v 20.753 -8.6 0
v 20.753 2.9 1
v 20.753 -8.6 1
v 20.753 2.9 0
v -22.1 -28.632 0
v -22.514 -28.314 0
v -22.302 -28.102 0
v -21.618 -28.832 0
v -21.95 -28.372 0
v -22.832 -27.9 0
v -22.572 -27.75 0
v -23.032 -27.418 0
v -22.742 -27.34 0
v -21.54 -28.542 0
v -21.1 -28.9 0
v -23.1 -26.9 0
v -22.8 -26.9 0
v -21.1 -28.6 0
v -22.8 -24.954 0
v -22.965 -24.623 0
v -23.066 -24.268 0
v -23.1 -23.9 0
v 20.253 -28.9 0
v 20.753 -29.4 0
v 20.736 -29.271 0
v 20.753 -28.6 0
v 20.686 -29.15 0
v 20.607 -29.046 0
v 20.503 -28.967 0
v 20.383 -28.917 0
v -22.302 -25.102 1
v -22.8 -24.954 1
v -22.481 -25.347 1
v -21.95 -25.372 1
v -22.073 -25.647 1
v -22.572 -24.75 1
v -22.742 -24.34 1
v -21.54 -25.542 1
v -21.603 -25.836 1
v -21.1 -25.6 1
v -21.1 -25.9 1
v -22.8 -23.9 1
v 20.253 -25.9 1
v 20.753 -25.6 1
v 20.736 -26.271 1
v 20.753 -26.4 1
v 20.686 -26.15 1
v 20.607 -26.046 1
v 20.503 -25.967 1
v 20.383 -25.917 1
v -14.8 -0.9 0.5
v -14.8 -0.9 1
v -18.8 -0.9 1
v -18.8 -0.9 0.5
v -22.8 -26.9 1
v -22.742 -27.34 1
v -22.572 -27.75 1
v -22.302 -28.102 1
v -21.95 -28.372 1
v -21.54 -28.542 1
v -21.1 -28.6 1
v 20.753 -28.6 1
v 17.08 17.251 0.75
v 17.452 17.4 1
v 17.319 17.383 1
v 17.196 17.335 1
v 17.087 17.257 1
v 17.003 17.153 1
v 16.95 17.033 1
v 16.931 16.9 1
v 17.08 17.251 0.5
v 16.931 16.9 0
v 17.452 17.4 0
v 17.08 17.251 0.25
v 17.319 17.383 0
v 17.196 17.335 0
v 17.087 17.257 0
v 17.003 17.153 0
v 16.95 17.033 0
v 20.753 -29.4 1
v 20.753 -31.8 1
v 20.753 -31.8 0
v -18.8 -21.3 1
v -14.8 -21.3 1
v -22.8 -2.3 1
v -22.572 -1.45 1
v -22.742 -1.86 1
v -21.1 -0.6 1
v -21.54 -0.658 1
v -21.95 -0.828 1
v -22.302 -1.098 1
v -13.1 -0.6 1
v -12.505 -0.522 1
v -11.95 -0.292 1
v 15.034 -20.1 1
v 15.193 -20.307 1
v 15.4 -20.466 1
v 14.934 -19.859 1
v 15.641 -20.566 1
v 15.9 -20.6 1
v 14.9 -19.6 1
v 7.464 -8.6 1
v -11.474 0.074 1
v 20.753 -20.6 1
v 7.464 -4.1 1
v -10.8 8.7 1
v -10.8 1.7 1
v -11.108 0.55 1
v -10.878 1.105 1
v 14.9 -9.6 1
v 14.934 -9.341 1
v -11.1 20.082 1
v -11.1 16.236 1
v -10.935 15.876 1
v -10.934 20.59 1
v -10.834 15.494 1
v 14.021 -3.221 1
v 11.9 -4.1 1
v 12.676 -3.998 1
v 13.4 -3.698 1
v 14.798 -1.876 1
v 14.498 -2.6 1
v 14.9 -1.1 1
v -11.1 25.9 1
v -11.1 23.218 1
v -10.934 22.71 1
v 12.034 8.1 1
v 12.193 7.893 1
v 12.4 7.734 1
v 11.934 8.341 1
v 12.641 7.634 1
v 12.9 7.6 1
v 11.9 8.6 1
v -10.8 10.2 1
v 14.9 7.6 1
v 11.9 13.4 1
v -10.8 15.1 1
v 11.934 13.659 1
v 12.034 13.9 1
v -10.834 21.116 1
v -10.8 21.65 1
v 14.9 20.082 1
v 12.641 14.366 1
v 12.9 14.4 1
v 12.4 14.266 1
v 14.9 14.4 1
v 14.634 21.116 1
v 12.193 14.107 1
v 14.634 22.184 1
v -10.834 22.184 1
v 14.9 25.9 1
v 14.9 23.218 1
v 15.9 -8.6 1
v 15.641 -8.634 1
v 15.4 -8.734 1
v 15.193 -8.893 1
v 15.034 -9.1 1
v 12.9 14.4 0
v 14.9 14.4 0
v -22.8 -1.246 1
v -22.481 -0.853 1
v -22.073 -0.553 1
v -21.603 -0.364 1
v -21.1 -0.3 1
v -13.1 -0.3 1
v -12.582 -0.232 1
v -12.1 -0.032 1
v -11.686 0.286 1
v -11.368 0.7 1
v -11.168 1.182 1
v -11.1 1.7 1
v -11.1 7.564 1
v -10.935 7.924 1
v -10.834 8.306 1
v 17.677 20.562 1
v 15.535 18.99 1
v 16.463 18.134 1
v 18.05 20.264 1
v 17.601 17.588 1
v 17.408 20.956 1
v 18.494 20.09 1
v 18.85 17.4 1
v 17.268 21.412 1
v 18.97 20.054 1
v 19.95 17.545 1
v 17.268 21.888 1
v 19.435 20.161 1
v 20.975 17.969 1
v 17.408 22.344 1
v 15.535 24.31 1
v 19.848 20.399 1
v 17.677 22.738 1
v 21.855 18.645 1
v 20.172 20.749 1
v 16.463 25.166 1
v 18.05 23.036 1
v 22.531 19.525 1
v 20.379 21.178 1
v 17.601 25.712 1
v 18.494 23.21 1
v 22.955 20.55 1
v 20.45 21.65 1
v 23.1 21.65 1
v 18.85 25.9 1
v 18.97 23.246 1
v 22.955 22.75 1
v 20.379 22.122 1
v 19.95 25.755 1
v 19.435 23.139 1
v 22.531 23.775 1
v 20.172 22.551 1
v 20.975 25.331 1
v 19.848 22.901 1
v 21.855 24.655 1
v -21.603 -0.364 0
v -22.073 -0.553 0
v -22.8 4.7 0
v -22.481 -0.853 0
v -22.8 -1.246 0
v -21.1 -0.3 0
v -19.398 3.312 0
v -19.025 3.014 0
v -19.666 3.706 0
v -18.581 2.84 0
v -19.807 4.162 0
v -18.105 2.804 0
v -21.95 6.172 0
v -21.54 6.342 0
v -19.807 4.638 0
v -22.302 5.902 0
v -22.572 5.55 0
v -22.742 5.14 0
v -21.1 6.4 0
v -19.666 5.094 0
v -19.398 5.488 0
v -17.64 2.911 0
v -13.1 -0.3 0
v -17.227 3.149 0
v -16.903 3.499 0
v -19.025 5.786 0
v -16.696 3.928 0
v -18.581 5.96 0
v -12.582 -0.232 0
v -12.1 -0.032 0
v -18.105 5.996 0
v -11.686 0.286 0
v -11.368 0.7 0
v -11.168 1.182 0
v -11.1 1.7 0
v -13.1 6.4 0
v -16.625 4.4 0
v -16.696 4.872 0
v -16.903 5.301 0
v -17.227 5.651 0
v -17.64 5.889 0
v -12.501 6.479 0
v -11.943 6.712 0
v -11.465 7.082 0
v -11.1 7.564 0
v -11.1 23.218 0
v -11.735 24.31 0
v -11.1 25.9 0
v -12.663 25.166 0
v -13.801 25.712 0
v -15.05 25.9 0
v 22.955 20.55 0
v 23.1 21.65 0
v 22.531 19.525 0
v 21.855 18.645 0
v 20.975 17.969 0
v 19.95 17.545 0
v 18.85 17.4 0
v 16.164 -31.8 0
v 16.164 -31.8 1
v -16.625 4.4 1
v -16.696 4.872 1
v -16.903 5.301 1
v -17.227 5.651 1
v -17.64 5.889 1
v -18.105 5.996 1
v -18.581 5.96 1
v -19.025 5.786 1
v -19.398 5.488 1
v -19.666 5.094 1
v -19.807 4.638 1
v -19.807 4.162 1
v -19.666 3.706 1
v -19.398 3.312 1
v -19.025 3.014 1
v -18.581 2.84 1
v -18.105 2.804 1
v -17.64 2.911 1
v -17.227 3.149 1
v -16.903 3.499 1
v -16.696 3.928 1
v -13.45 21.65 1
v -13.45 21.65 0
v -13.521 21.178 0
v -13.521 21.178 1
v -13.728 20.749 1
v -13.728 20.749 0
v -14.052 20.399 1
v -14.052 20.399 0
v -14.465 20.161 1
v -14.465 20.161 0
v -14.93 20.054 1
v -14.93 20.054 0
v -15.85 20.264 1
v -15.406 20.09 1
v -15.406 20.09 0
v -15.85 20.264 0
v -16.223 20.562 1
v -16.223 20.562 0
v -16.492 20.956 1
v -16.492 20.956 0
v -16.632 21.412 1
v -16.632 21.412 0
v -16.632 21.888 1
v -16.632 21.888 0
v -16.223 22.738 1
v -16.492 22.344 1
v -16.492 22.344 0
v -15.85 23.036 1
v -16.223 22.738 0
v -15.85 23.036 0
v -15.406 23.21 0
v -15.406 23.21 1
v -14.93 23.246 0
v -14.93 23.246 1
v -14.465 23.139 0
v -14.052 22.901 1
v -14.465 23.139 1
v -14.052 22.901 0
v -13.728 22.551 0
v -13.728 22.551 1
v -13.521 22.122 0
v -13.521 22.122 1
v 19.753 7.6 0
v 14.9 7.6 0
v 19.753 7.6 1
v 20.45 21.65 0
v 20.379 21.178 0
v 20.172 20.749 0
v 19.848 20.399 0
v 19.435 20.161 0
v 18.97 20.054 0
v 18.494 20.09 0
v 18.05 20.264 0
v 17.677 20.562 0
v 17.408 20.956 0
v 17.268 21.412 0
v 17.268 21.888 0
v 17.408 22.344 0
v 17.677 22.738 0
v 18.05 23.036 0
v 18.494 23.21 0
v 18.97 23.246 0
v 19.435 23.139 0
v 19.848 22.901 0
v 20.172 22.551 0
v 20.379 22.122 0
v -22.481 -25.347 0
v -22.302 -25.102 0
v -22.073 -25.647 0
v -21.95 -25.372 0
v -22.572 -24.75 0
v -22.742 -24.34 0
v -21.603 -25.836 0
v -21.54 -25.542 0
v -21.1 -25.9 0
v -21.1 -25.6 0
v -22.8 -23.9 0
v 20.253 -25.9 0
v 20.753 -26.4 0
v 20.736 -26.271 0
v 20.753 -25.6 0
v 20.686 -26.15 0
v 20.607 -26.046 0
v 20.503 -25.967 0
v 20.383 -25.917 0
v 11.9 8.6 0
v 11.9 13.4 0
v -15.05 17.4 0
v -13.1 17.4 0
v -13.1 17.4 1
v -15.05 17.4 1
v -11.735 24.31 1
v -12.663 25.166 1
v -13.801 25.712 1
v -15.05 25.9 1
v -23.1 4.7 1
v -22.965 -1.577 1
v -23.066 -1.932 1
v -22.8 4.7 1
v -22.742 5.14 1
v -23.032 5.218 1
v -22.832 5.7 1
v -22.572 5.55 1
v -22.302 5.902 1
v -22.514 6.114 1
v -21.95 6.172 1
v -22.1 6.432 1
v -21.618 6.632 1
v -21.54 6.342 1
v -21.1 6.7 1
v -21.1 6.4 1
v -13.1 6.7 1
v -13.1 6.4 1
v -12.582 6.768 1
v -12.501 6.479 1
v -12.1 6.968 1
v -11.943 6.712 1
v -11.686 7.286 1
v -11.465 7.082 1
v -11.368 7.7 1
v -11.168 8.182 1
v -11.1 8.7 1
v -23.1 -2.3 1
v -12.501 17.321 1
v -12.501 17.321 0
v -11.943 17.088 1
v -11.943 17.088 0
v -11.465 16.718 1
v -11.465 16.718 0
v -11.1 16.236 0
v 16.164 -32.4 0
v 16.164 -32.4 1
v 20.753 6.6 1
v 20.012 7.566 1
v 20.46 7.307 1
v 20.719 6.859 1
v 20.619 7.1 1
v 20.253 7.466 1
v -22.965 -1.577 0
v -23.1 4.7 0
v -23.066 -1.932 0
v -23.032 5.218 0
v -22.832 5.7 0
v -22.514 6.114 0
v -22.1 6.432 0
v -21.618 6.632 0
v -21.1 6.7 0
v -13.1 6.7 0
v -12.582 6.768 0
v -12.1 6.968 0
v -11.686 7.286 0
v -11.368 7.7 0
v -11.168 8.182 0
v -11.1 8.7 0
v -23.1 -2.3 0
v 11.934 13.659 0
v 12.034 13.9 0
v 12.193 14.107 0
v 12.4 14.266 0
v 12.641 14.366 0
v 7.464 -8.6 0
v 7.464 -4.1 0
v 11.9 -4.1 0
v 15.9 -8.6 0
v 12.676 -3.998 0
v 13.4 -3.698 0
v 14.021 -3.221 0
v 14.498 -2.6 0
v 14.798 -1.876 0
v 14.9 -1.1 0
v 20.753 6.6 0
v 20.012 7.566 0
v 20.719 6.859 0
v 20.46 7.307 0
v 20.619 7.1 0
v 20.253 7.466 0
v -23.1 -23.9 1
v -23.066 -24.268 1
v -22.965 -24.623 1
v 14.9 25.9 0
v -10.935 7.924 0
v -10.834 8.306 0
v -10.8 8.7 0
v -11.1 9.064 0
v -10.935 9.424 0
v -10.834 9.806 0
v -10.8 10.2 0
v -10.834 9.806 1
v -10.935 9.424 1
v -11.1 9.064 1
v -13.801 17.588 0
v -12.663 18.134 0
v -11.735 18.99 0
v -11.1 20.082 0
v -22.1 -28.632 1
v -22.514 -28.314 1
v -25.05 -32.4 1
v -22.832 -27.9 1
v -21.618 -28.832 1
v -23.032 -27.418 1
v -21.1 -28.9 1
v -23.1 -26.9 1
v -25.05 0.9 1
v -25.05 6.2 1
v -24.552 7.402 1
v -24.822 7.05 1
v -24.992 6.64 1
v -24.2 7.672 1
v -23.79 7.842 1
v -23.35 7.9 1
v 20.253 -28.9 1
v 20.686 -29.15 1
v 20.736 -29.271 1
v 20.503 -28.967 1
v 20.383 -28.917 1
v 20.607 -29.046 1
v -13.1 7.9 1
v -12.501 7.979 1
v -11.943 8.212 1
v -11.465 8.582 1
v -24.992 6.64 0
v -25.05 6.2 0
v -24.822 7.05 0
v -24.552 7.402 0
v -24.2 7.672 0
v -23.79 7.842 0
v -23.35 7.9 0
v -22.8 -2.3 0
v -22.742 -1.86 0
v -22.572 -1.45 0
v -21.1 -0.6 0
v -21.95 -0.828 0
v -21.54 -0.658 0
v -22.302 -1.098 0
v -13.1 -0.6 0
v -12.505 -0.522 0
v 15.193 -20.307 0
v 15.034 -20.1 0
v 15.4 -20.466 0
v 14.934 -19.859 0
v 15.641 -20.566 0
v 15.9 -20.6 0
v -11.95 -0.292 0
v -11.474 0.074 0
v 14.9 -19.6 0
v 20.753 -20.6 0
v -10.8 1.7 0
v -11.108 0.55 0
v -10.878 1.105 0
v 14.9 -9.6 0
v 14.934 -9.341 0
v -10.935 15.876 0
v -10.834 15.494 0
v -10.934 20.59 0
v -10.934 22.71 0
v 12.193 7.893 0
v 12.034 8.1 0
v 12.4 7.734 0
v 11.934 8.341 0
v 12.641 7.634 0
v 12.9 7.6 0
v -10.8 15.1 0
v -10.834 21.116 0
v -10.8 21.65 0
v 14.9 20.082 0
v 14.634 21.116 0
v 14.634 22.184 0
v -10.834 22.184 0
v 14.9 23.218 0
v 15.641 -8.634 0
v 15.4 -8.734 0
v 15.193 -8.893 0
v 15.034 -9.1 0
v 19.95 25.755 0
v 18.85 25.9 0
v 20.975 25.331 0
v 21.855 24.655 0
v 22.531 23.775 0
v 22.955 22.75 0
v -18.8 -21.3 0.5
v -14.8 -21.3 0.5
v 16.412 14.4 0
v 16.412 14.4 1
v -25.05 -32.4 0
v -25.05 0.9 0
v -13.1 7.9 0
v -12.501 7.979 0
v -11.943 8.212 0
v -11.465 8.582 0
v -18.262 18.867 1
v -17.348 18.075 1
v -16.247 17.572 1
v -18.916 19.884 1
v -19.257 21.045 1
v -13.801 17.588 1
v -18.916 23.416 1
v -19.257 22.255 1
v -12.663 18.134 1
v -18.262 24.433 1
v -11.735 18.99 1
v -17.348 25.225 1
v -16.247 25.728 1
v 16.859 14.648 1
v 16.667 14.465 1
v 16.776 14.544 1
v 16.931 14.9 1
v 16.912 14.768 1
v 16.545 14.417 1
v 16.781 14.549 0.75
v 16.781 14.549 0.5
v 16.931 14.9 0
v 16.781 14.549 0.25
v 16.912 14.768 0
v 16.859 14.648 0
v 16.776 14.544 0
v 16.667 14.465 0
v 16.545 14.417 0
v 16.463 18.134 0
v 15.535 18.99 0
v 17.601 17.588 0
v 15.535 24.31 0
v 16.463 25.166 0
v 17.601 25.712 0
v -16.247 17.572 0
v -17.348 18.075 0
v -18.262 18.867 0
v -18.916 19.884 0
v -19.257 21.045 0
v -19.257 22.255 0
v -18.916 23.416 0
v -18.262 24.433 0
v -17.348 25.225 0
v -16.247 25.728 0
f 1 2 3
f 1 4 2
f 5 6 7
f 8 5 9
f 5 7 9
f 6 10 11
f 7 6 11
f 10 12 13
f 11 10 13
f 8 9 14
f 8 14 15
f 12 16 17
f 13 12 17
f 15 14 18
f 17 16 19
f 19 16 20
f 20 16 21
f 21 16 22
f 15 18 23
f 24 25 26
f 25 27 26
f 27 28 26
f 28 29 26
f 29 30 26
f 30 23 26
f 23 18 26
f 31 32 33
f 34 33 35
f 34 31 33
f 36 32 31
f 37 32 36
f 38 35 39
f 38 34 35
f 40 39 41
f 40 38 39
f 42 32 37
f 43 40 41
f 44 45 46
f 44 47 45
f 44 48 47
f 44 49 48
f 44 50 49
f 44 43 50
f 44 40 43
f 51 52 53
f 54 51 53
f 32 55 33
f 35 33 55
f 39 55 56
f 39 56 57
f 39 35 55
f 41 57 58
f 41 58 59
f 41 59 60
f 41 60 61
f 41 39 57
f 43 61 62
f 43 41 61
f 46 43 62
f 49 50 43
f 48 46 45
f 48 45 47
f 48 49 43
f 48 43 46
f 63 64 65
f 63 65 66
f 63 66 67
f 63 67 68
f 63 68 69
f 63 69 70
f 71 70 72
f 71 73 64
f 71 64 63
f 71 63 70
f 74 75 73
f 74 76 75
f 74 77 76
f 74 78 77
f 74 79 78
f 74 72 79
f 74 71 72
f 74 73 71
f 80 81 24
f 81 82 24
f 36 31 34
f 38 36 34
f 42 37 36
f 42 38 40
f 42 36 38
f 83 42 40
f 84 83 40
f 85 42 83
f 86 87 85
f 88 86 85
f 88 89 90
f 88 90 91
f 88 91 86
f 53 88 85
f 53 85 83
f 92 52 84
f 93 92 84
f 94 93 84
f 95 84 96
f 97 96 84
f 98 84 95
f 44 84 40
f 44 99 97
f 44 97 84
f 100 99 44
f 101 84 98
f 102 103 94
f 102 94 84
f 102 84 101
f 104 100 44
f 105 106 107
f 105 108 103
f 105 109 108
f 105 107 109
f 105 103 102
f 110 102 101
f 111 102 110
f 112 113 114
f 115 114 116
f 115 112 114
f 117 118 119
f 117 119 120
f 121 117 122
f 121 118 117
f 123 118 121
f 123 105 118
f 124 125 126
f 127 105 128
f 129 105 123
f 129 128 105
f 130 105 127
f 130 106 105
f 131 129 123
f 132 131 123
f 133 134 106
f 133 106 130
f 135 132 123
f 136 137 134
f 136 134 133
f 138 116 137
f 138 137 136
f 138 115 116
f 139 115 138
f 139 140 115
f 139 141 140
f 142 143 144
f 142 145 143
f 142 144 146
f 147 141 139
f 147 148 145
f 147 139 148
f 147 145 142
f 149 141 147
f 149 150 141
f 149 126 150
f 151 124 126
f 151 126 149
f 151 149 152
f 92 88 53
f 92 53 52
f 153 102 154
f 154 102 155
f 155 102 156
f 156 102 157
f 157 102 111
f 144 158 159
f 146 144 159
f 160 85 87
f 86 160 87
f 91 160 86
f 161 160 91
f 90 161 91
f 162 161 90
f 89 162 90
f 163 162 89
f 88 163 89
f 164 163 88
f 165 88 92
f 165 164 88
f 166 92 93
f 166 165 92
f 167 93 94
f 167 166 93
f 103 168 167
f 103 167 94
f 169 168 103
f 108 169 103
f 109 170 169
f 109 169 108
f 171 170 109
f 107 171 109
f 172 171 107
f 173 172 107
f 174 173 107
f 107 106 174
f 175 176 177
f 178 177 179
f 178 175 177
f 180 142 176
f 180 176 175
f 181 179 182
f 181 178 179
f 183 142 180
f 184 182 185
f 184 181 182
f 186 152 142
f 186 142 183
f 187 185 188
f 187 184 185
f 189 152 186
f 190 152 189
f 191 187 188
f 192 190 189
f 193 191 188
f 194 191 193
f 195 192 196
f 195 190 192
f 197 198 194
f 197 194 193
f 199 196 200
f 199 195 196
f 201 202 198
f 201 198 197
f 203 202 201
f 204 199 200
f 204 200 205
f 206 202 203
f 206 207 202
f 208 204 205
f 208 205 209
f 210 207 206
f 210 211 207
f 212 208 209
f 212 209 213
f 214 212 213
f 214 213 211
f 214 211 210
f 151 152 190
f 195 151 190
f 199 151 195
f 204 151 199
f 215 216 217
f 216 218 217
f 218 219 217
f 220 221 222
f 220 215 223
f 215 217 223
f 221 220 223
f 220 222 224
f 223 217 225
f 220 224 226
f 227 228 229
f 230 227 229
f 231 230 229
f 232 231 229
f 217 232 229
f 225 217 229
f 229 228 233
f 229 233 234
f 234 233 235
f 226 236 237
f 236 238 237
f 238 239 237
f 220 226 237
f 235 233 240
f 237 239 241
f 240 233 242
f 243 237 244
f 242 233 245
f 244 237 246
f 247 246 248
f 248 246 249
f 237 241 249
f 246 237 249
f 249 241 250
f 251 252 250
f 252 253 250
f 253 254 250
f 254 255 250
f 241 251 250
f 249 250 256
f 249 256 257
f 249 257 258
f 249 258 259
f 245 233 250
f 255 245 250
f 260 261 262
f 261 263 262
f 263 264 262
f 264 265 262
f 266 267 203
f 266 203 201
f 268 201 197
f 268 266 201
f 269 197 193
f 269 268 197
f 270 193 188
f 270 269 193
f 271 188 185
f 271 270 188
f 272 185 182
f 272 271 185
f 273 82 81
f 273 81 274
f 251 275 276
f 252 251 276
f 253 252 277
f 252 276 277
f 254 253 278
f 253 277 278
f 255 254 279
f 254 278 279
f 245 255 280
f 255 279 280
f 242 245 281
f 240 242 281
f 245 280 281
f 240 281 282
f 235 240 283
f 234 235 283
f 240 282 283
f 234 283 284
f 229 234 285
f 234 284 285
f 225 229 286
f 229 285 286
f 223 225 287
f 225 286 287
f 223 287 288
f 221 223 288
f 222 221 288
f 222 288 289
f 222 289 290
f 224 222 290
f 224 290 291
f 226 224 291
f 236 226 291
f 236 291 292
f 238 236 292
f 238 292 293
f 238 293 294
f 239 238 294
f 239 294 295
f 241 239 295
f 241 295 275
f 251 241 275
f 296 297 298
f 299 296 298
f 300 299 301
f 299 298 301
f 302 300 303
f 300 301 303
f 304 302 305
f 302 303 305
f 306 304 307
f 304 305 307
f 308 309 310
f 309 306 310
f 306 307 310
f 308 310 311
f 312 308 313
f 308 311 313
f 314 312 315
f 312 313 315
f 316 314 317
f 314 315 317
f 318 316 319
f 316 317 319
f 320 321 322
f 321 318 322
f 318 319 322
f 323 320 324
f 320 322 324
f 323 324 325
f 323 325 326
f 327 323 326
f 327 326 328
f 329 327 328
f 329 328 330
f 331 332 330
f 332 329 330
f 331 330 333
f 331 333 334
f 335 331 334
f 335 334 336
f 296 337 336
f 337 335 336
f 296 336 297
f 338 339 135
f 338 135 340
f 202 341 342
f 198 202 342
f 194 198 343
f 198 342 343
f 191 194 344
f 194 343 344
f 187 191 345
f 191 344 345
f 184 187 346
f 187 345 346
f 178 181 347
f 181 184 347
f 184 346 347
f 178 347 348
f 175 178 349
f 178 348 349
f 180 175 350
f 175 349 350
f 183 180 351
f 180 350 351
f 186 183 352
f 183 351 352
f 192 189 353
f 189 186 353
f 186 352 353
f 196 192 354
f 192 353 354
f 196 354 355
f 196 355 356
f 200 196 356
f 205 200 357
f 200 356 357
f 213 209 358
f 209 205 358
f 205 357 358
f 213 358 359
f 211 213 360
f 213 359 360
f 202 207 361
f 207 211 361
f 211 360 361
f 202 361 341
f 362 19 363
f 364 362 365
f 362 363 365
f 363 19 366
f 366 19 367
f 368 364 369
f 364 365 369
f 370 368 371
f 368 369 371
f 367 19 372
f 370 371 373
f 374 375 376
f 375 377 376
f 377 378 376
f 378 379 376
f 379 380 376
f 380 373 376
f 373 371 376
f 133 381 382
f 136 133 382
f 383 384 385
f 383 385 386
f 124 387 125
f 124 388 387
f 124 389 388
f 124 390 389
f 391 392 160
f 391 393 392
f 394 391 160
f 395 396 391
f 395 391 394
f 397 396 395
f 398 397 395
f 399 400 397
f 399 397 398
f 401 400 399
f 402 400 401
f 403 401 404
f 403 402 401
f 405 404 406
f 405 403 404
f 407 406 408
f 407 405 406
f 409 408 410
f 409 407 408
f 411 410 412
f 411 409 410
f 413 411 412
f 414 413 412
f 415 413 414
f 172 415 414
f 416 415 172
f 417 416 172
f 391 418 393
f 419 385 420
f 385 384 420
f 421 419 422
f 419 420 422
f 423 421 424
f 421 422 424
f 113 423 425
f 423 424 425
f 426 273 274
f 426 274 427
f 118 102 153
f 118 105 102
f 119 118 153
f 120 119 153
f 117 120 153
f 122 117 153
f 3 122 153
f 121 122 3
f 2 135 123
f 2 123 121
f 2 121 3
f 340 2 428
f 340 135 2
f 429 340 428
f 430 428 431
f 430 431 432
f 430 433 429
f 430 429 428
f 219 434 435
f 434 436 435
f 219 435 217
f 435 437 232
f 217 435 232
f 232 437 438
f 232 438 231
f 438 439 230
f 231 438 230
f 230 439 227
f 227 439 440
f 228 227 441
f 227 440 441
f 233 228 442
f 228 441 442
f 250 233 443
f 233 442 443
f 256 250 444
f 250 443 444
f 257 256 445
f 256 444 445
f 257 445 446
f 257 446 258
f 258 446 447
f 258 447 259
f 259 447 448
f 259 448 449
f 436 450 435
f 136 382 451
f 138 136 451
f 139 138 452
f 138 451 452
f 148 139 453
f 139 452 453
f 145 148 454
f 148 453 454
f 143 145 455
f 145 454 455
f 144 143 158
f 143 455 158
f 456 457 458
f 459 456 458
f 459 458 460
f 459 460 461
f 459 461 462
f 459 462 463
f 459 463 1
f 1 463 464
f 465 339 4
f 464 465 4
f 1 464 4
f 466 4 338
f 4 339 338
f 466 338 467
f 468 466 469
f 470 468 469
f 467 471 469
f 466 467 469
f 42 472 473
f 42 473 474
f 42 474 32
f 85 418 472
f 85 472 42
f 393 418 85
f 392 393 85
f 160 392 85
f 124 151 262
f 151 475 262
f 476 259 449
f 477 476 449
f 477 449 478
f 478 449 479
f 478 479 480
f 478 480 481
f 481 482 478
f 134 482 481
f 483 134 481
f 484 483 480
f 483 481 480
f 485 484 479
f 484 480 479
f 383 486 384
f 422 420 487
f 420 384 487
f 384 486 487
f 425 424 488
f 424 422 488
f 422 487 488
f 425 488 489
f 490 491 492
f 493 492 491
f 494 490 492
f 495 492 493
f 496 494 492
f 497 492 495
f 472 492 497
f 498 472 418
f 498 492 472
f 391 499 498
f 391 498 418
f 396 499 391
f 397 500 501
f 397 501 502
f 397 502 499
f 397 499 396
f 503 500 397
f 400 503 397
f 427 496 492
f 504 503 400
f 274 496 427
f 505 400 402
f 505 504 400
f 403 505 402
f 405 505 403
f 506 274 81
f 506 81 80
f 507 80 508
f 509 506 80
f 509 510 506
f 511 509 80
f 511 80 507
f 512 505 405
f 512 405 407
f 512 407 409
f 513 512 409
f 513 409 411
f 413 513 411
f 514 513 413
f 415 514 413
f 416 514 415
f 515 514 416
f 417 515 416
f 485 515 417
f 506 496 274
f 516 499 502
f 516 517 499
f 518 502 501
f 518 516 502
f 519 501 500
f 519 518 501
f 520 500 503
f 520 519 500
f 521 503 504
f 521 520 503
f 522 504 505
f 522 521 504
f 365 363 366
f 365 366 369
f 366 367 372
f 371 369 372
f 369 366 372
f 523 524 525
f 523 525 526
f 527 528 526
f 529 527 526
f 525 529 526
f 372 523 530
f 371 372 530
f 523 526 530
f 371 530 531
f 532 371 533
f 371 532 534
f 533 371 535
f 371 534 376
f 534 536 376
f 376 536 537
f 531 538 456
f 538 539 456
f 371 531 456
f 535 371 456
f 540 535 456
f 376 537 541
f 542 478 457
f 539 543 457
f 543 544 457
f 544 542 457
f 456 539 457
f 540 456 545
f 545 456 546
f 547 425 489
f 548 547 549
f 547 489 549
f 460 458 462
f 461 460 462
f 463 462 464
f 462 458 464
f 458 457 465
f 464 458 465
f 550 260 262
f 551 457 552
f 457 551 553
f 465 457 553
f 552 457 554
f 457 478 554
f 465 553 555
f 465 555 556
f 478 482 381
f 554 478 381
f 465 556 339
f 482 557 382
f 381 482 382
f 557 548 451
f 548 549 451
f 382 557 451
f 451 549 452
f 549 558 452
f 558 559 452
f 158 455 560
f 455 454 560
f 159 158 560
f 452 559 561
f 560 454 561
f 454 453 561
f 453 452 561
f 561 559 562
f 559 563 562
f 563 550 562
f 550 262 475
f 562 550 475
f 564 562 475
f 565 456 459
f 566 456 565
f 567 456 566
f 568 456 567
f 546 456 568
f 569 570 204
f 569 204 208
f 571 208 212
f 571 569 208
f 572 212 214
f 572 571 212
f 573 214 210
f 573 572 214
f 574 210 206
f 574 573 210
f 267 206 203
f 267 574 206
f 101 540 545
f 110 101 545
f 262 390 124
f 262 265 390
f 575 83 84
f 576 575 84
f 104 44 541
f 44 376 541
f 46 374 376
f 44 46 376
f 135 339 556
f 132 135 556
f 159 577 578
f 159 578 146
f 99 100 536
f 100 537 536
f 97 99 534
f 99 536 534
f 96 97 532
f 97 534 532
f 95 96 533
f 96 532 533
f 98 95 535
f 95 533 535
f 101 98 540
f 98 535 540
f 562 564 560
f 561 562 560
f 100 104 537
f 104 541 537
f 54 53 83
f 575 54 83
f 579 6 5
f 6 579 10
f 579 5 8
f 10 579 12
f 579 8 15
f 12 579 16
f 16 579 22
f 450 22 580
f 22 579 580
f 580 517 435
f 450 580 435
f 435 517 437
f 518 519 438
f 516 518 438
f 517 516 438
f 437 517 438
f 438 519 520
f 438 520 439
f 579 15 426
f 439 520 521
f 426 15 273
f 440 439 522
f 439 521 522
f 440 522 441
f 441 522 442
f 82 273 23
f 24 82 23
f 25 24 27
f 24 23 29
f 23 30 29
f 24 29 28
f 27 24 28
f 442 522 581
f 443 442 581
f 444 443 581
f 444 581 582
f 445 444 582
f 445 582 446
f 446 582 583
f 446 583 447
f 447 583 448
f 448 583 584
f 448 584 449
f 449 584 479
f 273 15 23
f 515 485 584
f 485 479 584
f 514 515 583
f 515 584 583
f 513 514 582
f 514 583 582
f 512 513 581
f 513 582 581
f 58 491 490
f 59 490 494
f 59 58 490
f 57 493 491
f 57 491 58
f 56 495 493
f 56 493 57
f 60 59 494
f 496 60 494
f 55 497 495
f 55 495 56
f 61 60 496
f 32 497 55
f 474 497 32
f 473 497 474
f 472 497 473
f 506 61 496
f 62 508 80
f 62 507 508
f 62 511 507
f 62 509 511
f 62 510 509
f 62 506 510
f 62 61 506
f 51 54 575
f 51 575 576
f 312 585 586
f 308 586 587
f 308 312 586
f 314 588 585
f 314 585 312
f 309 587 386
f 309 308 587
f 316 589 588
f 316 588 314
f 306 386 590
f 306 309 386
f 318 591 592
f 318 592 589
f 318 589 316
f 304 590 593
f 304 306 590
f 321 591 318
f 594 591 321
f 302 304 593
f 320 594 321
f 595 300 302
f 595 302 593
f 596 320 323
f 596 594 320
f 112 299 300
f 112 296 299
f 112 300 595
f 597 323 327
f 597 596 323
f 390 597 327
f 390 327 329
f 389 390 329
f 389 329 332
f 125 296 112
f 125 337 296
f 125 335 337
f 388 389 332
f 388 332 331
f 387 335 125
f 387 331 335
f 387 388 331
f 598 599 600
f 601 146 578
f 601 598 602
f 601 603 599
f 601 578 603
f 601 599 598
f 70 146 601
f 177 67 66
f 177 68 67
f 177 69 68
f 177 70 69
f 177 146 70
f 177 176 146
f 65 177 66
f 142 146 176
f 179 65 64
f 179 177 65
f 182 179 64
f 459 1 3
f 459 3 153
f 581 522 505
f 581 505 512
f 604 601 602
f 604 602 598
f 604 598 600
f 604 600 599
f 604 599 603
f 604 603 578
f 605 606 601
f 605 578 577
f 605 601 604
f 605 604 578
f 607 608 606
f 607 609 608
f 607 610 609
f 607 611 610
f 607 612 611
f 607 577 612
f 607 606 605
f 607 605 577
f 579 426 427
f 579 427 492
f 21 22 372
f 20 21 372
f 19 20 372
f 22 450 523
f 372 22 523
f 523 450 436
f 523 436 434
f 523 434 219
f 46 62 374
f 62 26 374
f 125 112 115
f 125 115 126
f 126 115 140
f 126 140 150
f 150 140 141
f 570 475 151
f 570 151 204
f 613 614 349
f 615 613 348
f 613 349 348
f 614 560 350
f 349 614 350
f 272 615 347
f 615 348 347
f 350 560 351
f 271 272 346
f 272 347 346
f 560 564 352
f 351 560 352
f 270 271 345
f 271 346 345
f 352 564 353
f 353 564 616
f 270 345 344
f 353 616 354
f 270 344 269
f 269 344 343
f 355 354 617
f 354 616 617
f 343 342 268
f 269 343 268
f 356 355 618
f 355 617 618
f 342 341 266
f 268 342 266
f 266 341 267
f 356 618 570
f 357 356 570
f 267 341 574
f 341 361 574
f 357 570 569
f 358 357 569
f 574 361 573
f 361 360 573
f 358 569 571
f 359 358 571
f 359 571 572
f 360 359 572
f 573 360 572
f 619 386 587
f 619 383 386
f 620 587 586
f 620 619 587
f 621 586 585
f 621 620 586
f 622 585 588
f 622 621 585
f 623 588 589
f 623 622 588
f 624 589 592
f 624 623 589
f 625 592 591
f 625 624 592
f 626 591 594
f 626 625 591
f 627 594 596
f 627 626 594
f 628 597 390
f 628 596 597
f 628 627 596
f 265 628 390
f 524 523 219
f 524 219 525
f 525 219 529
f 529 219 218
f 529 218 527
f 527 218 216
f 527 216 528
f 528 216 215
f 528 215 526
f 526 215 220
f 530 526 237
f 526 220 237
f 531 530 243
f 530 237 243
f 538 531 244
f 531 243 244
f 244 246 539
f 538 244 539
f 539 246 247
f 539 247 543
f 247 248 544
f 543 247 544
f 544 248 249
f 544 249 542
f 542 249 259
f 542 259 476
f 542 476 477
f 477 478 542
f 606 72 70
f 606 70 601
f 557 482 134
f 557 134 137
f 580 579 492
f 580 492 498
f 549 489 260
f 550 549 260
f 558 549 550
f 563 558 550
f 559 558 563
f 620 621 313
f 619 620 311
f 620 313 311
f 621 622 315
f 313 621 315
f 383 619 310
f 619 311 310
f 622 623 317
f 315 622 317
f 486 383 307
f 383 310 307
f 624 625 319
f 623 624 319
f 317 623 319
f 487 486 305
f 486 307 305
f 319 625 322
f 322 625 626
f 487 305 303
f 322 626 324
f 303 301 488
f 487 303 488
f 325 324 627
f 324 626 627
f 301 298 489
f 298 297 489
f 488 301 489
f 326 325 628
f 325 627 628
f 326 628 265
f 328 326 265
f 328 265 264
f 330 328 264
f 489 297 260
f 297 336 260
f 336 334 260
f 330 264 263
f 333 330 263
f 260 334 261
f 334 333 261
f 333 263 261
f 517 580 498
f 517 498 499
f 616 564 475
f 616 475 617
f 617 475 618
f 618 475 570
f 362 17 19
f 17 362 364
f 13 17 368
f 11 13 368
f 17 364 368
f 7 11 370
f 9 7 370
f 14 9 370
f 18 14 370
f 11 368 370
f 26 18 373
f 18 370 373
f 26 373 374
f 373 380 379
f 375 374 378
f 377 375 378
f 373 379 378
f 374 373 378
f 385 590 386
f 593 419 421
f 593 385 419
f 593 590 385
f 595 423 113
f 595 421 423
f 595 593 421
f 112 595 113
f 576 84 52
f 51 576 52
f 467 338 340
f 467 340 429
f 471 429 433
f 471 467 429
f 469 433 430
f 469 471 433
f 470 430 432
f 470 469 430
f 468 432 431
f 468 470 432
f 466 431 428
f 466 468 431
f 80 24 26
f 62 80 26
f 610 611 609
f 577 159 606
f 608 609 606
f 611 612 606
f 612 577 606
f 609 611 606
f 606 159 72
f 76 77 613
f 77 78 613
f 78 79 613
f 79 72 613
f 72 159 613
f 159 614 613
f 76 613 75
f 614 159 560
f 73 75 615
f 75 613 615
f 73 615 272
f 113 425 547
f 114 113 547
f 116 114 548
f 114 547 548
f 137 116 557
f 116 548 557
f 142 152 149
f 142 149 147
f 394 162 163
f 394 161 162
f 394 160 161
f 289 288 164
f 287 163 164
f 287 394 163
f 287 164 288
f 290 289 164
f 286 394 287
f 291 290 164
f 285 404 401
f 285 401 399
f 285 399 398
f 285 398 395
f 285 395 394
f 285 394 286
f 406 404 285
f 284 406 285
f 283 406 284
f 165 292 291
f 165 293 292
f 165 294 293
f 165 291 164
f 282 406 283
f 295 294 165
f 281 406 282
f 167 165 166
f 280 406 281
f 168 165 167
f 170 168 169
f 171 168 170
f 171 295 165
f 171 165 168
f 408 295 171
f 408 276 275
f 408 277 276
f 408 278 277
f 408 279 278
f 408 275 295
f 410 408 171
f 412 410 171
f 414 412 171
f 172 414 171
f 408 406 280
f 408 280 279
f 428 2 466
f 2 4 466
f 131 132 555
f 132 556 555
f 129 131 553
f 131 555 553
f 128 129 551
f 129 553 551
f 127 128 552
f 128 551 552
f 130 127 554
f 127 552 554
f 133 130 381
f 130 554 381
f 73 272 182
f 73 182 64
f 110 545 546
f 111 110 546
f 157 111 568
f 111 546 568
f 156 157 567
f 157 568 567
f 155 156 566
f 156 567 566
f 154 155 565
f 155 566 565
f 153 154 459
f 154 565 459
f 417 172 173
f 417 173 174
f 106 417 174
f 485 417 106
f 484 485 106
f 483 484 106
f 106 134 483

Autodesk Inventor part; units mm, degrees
ref_plane "YZ Plane" through (0, 0, 0) normal (1, 0, 0) x (0, 1, 0)
ref_plane "XZ Plane" through (0, 0, 0) normal (0, 1, 0) x (-1, 0, 0)
ref_plane "XY Plane" through (0, 0, 0) normal (0, 0, 1) x (1, 0, 0)
sketch "Эскиз1" plane through (0, 0, 0) normal (0, 0, 1) x (1, 0, 0)
  line L0 (-7.7719, -54) -> (-12.7719, -54) projected
  line L1 (-12.7719, -54) -> (-12.7719, -40.5) projected
  line L2 (-12.7719, -40.5) -> (-7.7719, -40.5) projected
  line L3 (-7.7719, -40.5) -> (-7.7719, -54) projected
  circle A0 centre (-17.7467, 10.9) radius 1.6 projected
  circle A1 centre (-17.7467, -40.1) radius 1.6 projected
  arc A2 (20.7533, -26.4) -> (20.2533, -25.9) centre (20.2533, -26.4) ccw projected
  line L4 (20.2533, -25.9) -> (-21.1, -25.9) projected
  arc A3 (-23.1, -23.9) -> (-21.1, -25.9) centre (-21.1, -23.9) ccw projected
  line L5 (-23.1, -23.9) -> (-23.1, -2.3) projected
  arc A4 (-21.1, -0.3) -> (-23.1, -2.3) centre (-21.1, -2.3) ccw projected
  line L6 (-21.1, -0.3) -> (-13.1, -0.3) projected
  arc A5 (-13.1, -0.3) -> (-11.1, 1.7) centre (-13.1, 1.7) ccw projected
  line L7 (-11.1, 1.7) -> (-11.1, 15.1) projected
  arc A6 (-11.1, 15.1) -> (-13.1, 17.1) centre (-13.1, 15.1) ccw projected
  line L8 (-13.1, 17.1) -> (-15.05, 17.1) projected
  arc A7 (-18.0974, 25.0287) -> (-15.05, 17.1) centre (-15.05, 21.65) ccw projected
  arc A8 (-18.0974, 25.0287) -> (-18.4323, 25.9) centre (-18.4323, 25.4) ccw projected
  line L9 (-25.3018, 25.9) -> (-18.4323, 25.9) projected
  line L10 (-25.3018, 25.9) -> (-25.3018, 22.9) projected
  line L11 (-26.6467, 22.9) -> (-25.3018, 22.9) projected
  line L12 (-26.6467, -42.7) -> (-26.6467, 22.9) projected
  line L13 (-26.6467, -42.7) -> (-18.7719, -42.7) projected
  line L14 (-18.7719, -42.7) -> (-18.7719, -54.2) projected
  line L15 (-18.7719, -54.2) -> (-25.3018, -54.2) projected
  line L16 (-25.3018, -54.2) -> (-25.3018, -55.1) projected
  line L17 (31.7533, -55.1) -> (-25.3018, -55.1) projected
  line L18 (31.7533, -55.1) -> (31.7533, -46.6) projected
  line L19 (31.7533, -46.6) -> (17.9318, -46.6) projected
  spline S0 degree 3 poles (17.3769, -46.1) (17.3769, -46.1597) (17.3919, -46.2298) (17.441, -46.342) (17.485, -46.4032) (17.5795, -46.4922) (17.6478, -46.5345) (17.7766, -46.5847) (17.8606, -46.6) (17.9318, -46.6) knots 0 0 0 0 0.017914 0.017914 0.036753 0.036753 0.056849 0.056849 0.078208 0.078208 0.078208 0.078208 projected
  line L20 (17.3769, -46.1) -> (17.3769, -44.1) projected
  spline S1 degree 3 poles (16.8292, -43.6) (16.8984, -43.6) (16.9801, -43.6153) (17.1065, -43.6649) (17.1743, -43.7071) (17.2685, -43.796) (17.3126, -43.8574) (17.3619, -43.9699) (17.3769, -44.0401) (17.3769, -44.1) knots 0.386783 0.386783 0.386783 0.386783 0.407551 0.407551 0.427519 0.427519 0.446405 0.446405 0.464367 0.464367 0.464367 0.464367 projected
  line L21 (16.8292, -43.6) -> (14.9, -43.6) projected
  line L22 (14.9, -43.6) -> (14.9, -36.8) projected
  line L23 (14.9, -36.8) -> (31.7533, -36.8) projected
  line L24 (31.7533, -36.8) -> (31.7533, -32.1) projected
  line L25 (31.7533, -32.1) -> (20.7533, -32.1) projected
  line L26 (20.7533, -32.1) -> (20.7533, -26.4) projected
  arc A9 (21.8974, 18.2713) -> (22.2323, 17.4) centre (22.2323, 17.9) ccw projected
  line L27 (22.2323, 17.4) -> (31.7533, 17.4) projected
  line L28 (31.7533, 17.4) -> (31.7533, 25.9) projected
  line L29 (22.2323, 25.9) -> (31.7533, 25.9) projected
  arc A10 (22.2323, 25.9) -> (21.8974, 25.0287) centre (22.2323, 25.4) ccw projected
  arc A11 (21.8974, 18.2713) -> (21.8974, 25.0287) centre (18.85, 21.65) ccw projected
  line L30 (21.5533, 2.9) -> (31.7533, 2.9) projected
  line L31 (31.7533, 2.9) -> (31.7533, 7.6) projected
  line L32 (31.7533, 7.6) -> (21.5533, 7.6) projected
  line L33 (7.4642, -8.6) -> (7.4642, -4.1) projected
  line L34 (20.7533, -8.6) -> (7.4642, -8.6) projected
  line L35 (20.7533, 2.9) -> (20.7533, -8.6) projected
  line L36 (21.5533, 2.9) -> (20.7533, 2.9) projected
  line L37 (14.9, 7.6) -> (21.5533, 7.6) projected
  line L38 (14.9, -1.1) -> (14.9, 7.6) projected
  arc A12 (11.9, -4.1) -> (14.9, -1.1) centre (11.9, -1.1) ccw projected
  line L39 (7.4642, -4.1) -> (11.9, -4.1) projected
  line L40 (7.4642, -4.1) -> (11.9, -4.1) projected
  circle A13 centre (-15.05, 21.65) radius 1.5 projected
  line L41 (-18.4323, 25.9) -> (-11.1, 25.9) projected
  arc A14 (-18.0974, 25.0287) -> (-18.4323, 25.9) centre (-18.4323, 25.4) ccw projected
  arc A15 (-18.0974, 25.0287) -> (-15.05, 17.1) centre (-15.05, 21.65) ccw projected
  line L42 (-13.1, 17.1) -> (-15.05, 17.1) projected
  arc A16 (-11.1, 15.1) -> (-13.1, 17.1) centre (-13.1, 15.1) ccw projected
  line L43 (-11.1, 25.9) -> (-11.1, 15.1) projected
  line L44 (14.9, 25.9) -> (22.2323, 25.9) projected
  line L45 (14.9, 14.4) -> (14.9, 25.9) projected
  line L46 (16.4121, 14.4) -> (14.9, 14.4) projected
  spline S2 degree 3 poles (16.9309, 14.9) (16.9309, 14.839) (16.9162, 14.7674) (16.8681, 14.654) (16.8258, 14.5925) (16.7358, 14.5046) (16.6718, 14.463) (16.5529, 14.4148) (16.4768, 14.4) (16.4121, 14.4) knots 0.150725 0.150725 0.150725 0.150725 0.169014 0.169014 0.187674 0.187674 0.206759 0.206759 0.226155 0.226155 0.226155 0.226155 projected
  line L47 (16.9309, 16.9) -> (16.9309, 14.9) projected
  spline S3 degree 3 poles (17.4522, 17.4) (17.3868, 17.4) (17.3098, 17.3852) (17.1901, 17.3368) (17.1259, 17.2952) (17.0358, 17.2072) (16.9935, 17.1458) (16.9455, 17.0325) (16.9309, 16.9609) (16.9309, 16.9) knots -0.075652 -0.075652 -0.075652 -0.075652 -0.056047 -0.056047 -0.036914 -0.036914 -0.018271 -0.018271 0 0 0 0 projected
  line L48 (22.2323, 17.4) -> (17.4522, 17.4) projected
  arc A17 (21.8974, 18.2713) -> (22.2323, 17.4) centre (22.2323, 17.9) ccw projected
  arc A18 (21.8974, 18.2713) -> (21.8974, 25.0287) centre (18.85, 21.65) ccw projected
  arc A19 (22.2323, 25.9) -> (21.8974, 25.0287) centre (22.2323, 25.4) ccw projected
  circle A20 centre (18.85, 21.65) radius 1.5 projected
  circle A21 centre (18.85, 21.65) radius 4.25
  circle A22 centre (-15.05, 21.65) radius 4.25
  line L49 (18.85, 25.9) -> (-15.05, 25.9)
  circle A23 centre (18.85, 21.65) radius 1.6
  circle A24 centre (-15.05, 21.65) radius 1.6
  line L50 (14.9, 7.6) -> (12.9, 7.6)
  line L51 (11.9, 8.6) -> (11.9, 13.4)
  line L52 (12.9, 14.4) -> (14.9, 14.4)
  line L53 (14.9, 14.4) -> (14.9, 7.6)
  line L54 (20.7533, -25.6) -> (-21.1, -25.6)
  arc A25 (-22.8, -23.9) -> (-21.1, -25.6) centre (-21.1, -23.9) ccw
  line L55 (-22.8, -23.9) -> (-22.8, -2.3)
  line L56 (-21.1, -0.6) -> (-13.1, -0.6)
  arc A26 (-13.1, -0.6) -> (-10.8, 1.7) centre (-13.1, 1.7) ccw
  arc A27 (-21.1, -0.6) -> (-22.8, -2.3) centre (-21.1, -2.3) ccw
  line L57 (-10.8, 1.7) -> (-10.8, 15.1)
  arc A28 (-10.8, 15.1) -> (-13.1, 17.4) centre (-13.1, 15.1) ccw
  line L58 (-13.1, 17.4) -> (-15.05, 17.4)
  arc A29 (21.0533, 3.4) -> (21.5533, 2.9) centre (21.5533, 3.4) ccw projected
  arc A30 (21.5533, 7.6) -> (21.0533, 7.1) centre (21.5533, 7.1) ccw projected
  line L59 (21.0533, 7.1) -> (21.0533, 3.4) projected
  arc A31 (21.0533, 3.4) -> (21.5533, 2.9) centre (21.5533, 3.4) ccw projected
  line L60 (21.0533, 7.1) -> (21.0533, 3.4) projected
  arc A32 (21.5533, 7.6) -> (21.0533, 7.1) centre (21.5533, 7.1) ccw projected
  line L61 (20.7533, 2.9) -> (20.7533, 6.6)
  line L62 (19.7533, 7.6) -> (14.9, 7.6)
  arc A33 (20.7533, 6.6) -> (19.7533, 7.6) centre (19.7533, 6.6) ccw
  arc A34 (11.9, 8.6) -> (12.9, 7.6) centre (12.9, 8.6) ccw
  arc A35 (12.9, 14.4) -> (11.9, 13.4) centre (12.9, 13.4) ccw
  line L63 (20.7533, -25.6) -> (20.7533, -20.6)
  line L64 (20.7533, -20.6) -> (15.9, -20.6)
  line L65 (20.7533, -8.6) -> (7.4642, -8.6) projected
  line L66 (20.7533, 2.9) -> (20.7533, -8.6) projected
  line L67 (21.5533, 2.9) -> (20.7533, 2.9) projected
  arc A36 (21.0533, 3.4) -> (21.5533, 2.9) centre (21.5533, 3.4) ccw projected
  line L68 (21.0533, 7.1) -> (21.0533, 3.4) projected
  arc A37 (21.5533, 7.6) -> (21.0533, 7.1) centre (21.5533, 7.1) ccw projected
  line L69 (14.9, 7.6) -> (21.5533, 7.6) projected
  line L70 (14.9, -1.1) -> (14.9, 7.6) projected
  arc A38 (11.9, -4.1) -> (14.9, -1.1) centre (11.9, -1.1) ccw projected
  line L71 (7.4642, -8.6) -> (7.4642, -4.1) projected
  arc A39 (14.9, -19.6) -> (15.9, -20.6) centre (15.9, -19.6) ccw projected
  line L72 (14.9, -19.6) -> (14.9, -9.6) projected
  arc A40 (15.9, -8.6) -> (14.9, -9.6) centre (15.9, -9.6) ccw projected
  line L73 (-7.7719, -54) -> (-12.7719, -54) projected
  line L74 (-12.7719, -54) -> (-12.7719, -40.5) projected
  line L75 (-12.7719, -40.5) -> (-7.7719, -40.5) projected
  line L76 (-7.7719, -40.5) -> (-7.7719, -54) projected
  circle A41 centre (-17.7467, 10.9) radius 1.6 projected
  circle A42 centre (-17.7467, -40.1) radius 1.6 projected
  arc A43 (20.7533, -26.4) -> (20.2533, -25.9) centre (20.2533, -26.4) ccw projected
  line L77 (20.2533, -25.9) -> (-21.1, -25.9) projected
  arc A44 (-23.1, -23.9) -> (-21.1, -25.9) centre (-21.1, -23.9) ccw projected
  line L78 (-23.1, -23.9) -> (-23.1, 4.7) projected
  arc A45 (-21.1, 6.7) -> (-23.1, 4.7) centre (-21.1, 4.7) ccw projected
  line L79 (-21.1, 6.7) -> (-13.1, 6.7) projected
  arc A46 (-13.1, 6.7) -> (-11.1, 8.7) centre (-13.1, 8.7) ccw projected
  line L80 (-11.1, 8.7) -> (-11.1, 15.1) projected
  arc A47 (-11.1, 15.1) -> (-13.1, 17.1) centre (-13.1, 15.1) ccw projected
  line L81 (-13.1, 17.1) -> (-15.05, 17.1) projected
  arc A48 (-18.0974, 25.0287) -> (-15.05, 17.1) centre (-15.05, 21.65) ccw projected
  arc A49 (-18.0974, 25.0287) -> (-18.4323, 25.9) centre (-18.4323, 25.4) ccw projected
  line L82 (-25.3018, 25.9) -> (-18.4323, 25.9) projected
  line L83 (-25.3018, 25.9) -> (-25.3018, 22.9) projected
  line L84 (-26.6467, 22.9) -> (-25.3018, 22.9) projected
  line L85 (-26.6467, -42.7) -> (-26.6467, 22.9) projected
  line L86 (-26.6467, -42.7) -> (-18.7719, -42.7) projected
  line L87 (-18.7719, -42.7) -> (-18.7719, -54.2) projected
  line L88 (-18.7719, -54.2) -> (-25.3018, -54.2) projected
  line L89 (-25.3018, -54.2) -> (-25.3018, -55.1) projected
  line L90 (31.7533, -55.1) -> (-25.3018, -55.1) projected
  line L91 (31.7533, -55.1) -> (31.7533, -46.6) projected
  line L92 (31.7533, -46.6) -> (17.9318, -46.6) projected
  spline S4 degree 3 poles (17.3769, -46.1) (17.3769, -46.1597) (17.3919, -46.2298) (17.441, -46.342) (17.485, -46.4032) (17.5795, -46.4922) (17.6478, -46.5345) (17.7766, -46.5847) (17.8606, -46.6) (17.9318, -46.6) knots 0 0 0 0 0.017914 0.017914 0.036753 0.036753 0.056849 0.056849 0.078208 0.078208 0.078208 0.078208 projected
  line L93 (17.3769, -46.1) -> (17.3769, -44.1) projected
  spline S5 degree 3 poles (16.8292, -43.6) (16.8984, -43.6) (16.9801, -43.6153) (17.1065, -43.6649) (17.1743, -43.7071) (17.2685, -43.796) (17.3126, -43.8574) (17.3619, -43.9699) (17.3769, -44.0401) (17.3769, -44.1) knots 0.386783 0.386783 0.386783 0.386783 0.407551 0.407551 0.427519 0.427519 0.446405 0.446405 0.464367 0.464367 0.464367 0.464367 projected
  line L94 (16.8292, -43.6) -> (14.9, -43.6) projected
  line L95 (14.9, -43.6) -> (14.9, -36.8) projected
  line L96 (14.9, -36.8) -> (31.7533, -36.8) projected
  line L97 (31.7533, -36.8) -> (31.7533, -32.1) projected
  line L98 (31.7533, -32.1) -> (20.7533, -32.1) projected
  line L99 (20.7533, -32.1) -> (20.7533, -26.4) projected
  line L100 (-10.8, 15.1) -> (-10.8, 8.7)
  arc A50 (-13.1, 6.4) -> (-10.8, 8.7) centre (-13.1, 8.7) ccw
  line L101 (-13.1, 6.4) -> (-21.1, 6.4)
  arc A51 (-21.1, 6.4) -> (-22.8, 4.7) centre (-21.1, 4.7) ccw
  line L102 (-22.8, 4.7) -> (-22.8, -23.9)
  line L103 (-7.7719, -54) -> (-12.7719, -54) projected
  line L104 (-12.7719, -54) -> (-12.7719, -40.5) projected
  line L105 (-12.7719, -40.5) -> (-7.7719, -40.5) projected
  line L106 (-7.7719, -40.5) -> (-7.7719, -54) projected
  circle A52 centre (-17.7467, 10.9) radius 1.6 projected
  circle A53 centre (-17.7467, -40.1) radius 1.6 projected
  arc A54 (20.7533, -29.4) -> (20.2533, -28.9) centre (20.2533, -29.4) ccw projected
  line L107 (20.2533, -28.9) -> (-21.1, -28.9) projected
  arc A55 (-23.1, -26.9) -> (-21.1, -28.9) centre (-21.1, -26.9) ccw projected
  line L108 (-23.1, -26.9) -> (-23.1, 4.7) projected
  arc A56 (-21.1, 6.7) -> (-23.1, 4.7) centre (-21.1, 4.7) ccw projected
  line L109 (-21.1, 6.7) -> (-13.1, 6.7) projected
  arc A57 (-13.1, 6.7) -> (-11.1, 8.7) centre (-13.1, 8.7) ccw projected
  line L110 (-11.1, 8.7) -> (-11.1, 15.1) projected
  arc A58 (-11.1, 15.1) -> (-13.1, 17.1) centre (-13.1, 15.1) ccw projected
  line L111 (-13.1, 17.1) -> (-15.05, 17.1) projected
  arc A59 (-18.0974, 25.0287) -> (-15.05, 17.1) centre (-15.05, 21.65) ccw projected
  arc A60 (-18.0974, 25.0287) -> (-18.4323, 25.9) centre (-18.4323, 25.4) ccw projected
  line L112 (-25.3018, 25.9) -> (-18.4323, 25.9) projected
  line L113 (-25.3018, 25.9) -> (-25.3018, 22.9) projected
  line L114 (-26.6467, 22.9) -> (-25.3018, 22.9) projected
  line L115 (-26.6467, -42.7) -> (-26.6467, 22.9) projected
  line L116 (-26.6467, -42.7) -> (-18.7719, -42.7) projected
  line L117 (-18.7719, -42.7) -> (-18.7719, -54.2) projected
  line L118 (-18.7719, -54.2) -> (-25.3018, -54.2) projected
  line L119 (-25.3018, -54.2) -> (-25.3018, -55.1) projected
  line L120 (31.7533, -55.1) -> (-25.3018, -55.1) projected
  line L121 (31.7533, -55.1) -> (31.7533, -46.6) projected
  line L122 (31.7533, -46.6) -> (17.9318, -46.6) projected
  spline S6 degree 3 poles (17.3769, -46.1) (17.3769, -46.1597) (17.3919, -46.2298) (17.441, -46.342) (17.485, -46.4032) (17.5795, -46.4922) (17.6478, -46.5345) (17.7766, -46.5847) (17.8606, -46.6) (17.9318, -46.6) knots 0 0 0 0 0.017914 0.017914 0.036753 0.036753 0.056849 0.056849 0.078208 0.078208 0.078208 0.078208 projected
  line L123 (17.3769, -46.1) -> (17.3769, -44.1) projected
  spline S7 degree 3 poles (16.8292, -43.6) (16.8984, -43.6) (16.9801, -43.6153) (17.1065, -43.6649) (17.1743, -43.7071) (17.2685, -43.796) (17.3126, -43.8574) (17.3619, -43.9699) (17.3769, -44.0401) (17.3769, -44.1) knots 0.386783 0.386783 0.386783 0.386783 0.407551 0.407551 0.427519 0.427519 0.446405 0.446405 0.464367 0.464367 0.464367 0.464367 projected
  line L124 (16.8292, -43.6) -> (14.9, -43.6) projected
  line L125 (14.9, -43.6) -> (14.9, -36.8) projected
  line L126 (14.9, -36.8) -> (31.7533, -36.8) projected
  line L127 (31.7533, -36.8) -> (31.7533, -32.1) projected
  line L128 (31.7533, -32.1) -> (20.7533, -32.1) projected
  line L129 (20.7533, -32.1) -> (20.7533, -29.4) projected
  line L130 (-22.8, 4.7) -> (-22.8, -26.9)
  arc A61 (-22.8, -26.9) -> (-21.1, -28.6) centre (-21.1, -26.9) ccw
  line L131 (-21.1, -28.6) -> (20.7533, -28.6)
  line L132 (21.0533, -29.4) -> (21.0533, -32.1)
  line L133 (20.7533, -28.6) -> (20.7533, -25.6)
  arc A62 (-23.3497, 8.2) -> (-25.3497, 6.2) centre (-23.3497, 6.2) ccw
  line L134 (-23.3497, 8.2) -> (-13.1, 8.2)
  arc A63 (-13.1, 8.2) -> (-11.1, 10.2) centre (-13.1, 10.2) ccw
  line L135 (-25.3497, 0.9) -> (-25.3497, 6.2)
  line L136 (-25.3499, -32.7) -> (-25.3499, 0.9)
  line L137 (16.4642, -32.7) -> (-25.3499, -32.7)
  line L138 (31.7533, -32.1) -> (16.4642, -32.1)
  line L139 (16.4642, -32.1) -> (16.4642, -32.7)
  line L140 (31.7533, -31.8) -> (16.1642, -31.8)
  line L141 (16.1642, -31.8) -> (16.1642, -32.4)
  line L142 (16.1642, -32.4) -> (-25.0499, -32.4)
  line L143 (-25.0499, -32.4) -> (-25.0499, 0.9)
  line L144 (-25.0497, 0.9) -> (-25.0497, 6.2)
  arc A64 (-23.3497, 7.9) -> (-25.0497, 6.2) centre (-23.3497, 6.2) ccw
  line L145 (-23.3497, 7.9) -> (-13.1, 7.9)
  arc A65 (-13.1, 7.9) -> (-10.8, 10.2) centre (-13.1, 10.2) ccw
  line L146 (-10.8, 10.2) -> (-10.8, 15.1)
  line L147 (20.7533, -28.6) -> (20.7533, -31.8)
  line L148 (20.7533, -28.6) -> (-21.1, -28.6)
  line L149 (-25.0499, -32.4) -> (16.1642, -32.4)
  line L150 (16.1642, -31.8) -> (16.1642, -32.4)
  line L151 (16.1642, -31.8) -> (20.7533, -31.8)
  line L152 (-25.0497, 6.2) -> (-25.0499, -32.4)
  line L153 (-10.8, 10.2) -> (-10.8, 1.7)
  point P0 (0, 0)
  point P1 (20.7533, 3.4)
  point P2 (20.7533, 7.1)
  point P3 (7.4642, -25.9)
  point P4 (-3.6642, -25.9)
  point P5 (11.9, 14.4)
  point P6 (20.7533, 7.6)
  point P7 (18.85, 17.4)
  point P8 (-22.8, -2.3)
  point P9 (-21.1, -25.6)
  point P10 (-11.1, 16.2358)
  point P11 (-22.8, -2.3)
  point P12 (20.7533, -26.4)
  point P13 (-11.1, 9.0642)
  point P14 (-22.8, -1.2464)
  point P15 (-22.8, -2.3)
  dimension "d0" = 3.2
  dimension "d1" = 3.2
  dimension "d2" = 3
  dimension "d3" = 0.3
  dimension "d4" = 0.3
  dimension "d5" = 0.3
  dimension "d6" = 0.3
  dimension "d7" = 0.3
  dimension "d8" = 0.3
  dimension "d9" = 0.3
  dimension "d10" = 0.3
  dimension "d11" = 0.3
  dimension "d12" = 1
  dimension "d13" = 1
  dimension "d20" = 0.3
  dimension "d22" = 0.3
  dimension "d26" = 0.3
  dimension "d27" = 0.3
extrude "Выдавливание1" add sketch "Эскиз1" along normal blind 1 contours L26 L131 A61 L130 A3 L4 A2 | A2 L4 A3 L130 A25 L54 L133 | L26 A54 L107 A55 L108 A3 L130 A61 L131 | L54 A25 L55 A27 L56 A26 L57 A28 L43 A22 L49 L45 A21 L52 A35 L51 A34 L50 L38 A12 L39 L33 L34 A40 L72 A39 L64 L63 | L26 L140 L141 L142 L143 L144 A64 L145 A65 L7 A46 L79 A45 L78 L5 L108 A55 L107 A54 | A3 L5 A4 L102 L55 L130 | L102 A4 L6 A5 L7 A50 L57 A26 L56 A27 | L78 A45 L79 A46 L7 A50 L101 A51 L102 A4 | L102 A51 L101 A50 L7 A5 L6 A4 | L34 L33 L39 A12 L38 L37 A33 L61 L35 | A50 L7 A65 L57 | A28 L58 A22 L43 | A22 L43 | L43 A22 | L45 A21 L48 S3 L47 S2 L46 | A22 L41 L43 | A21 L45 | L45 A21 | L45 L44 A21
sketch "Эскиз2" plane through (0, 0, 1) normal (0, 0, 1) x (1, 0, 0)
  circle A0 centre (-18.2249, 4.4) radius 2.1
  circle A1 centre (-18.2249, 4.4) radius 1.6
  point P0 (0, 0)
  dimension "d29" = 3.2
extrude "Выдавливание2" cut sketch "Эскиз2" against normal blind 1 contours A1
ref_plane "РабПлоскость1" through (-21.1, -11.1, 0) normal (0, 1, 0) x (1, 0, 0)
sketch "Эскиз3" plane through (0, 0, 1) normal (0, 0, 1) x (1, 0, 0)
  line L0 (-17.15, -1.45) -> (-18.45, -1.45) projected
  line L1 (-17.15, -2.75) -> (-17.15, -1.45) projected
  line L2 (-18.45, -2.75) -> (-17.15, -2.75) projected
  line L3 (-18.45, -1.45) -> (-18.45, -2.75) projected
  line L4 (-17.15, -3.45) -> (-18.45, -3.45) projected
  line L5 (-17.15, -4.75) -> (-17.15, -3.45) projected
  line L6 (-18.45, -4.75) -> (-17.15, -4.75) projected
  line L7 (-18.45, -3.45) -> (-18.45, -4.75) projected
  line L8 (-18.4122, -10.7426) -> (-17.1122, -10.7426) projected
  line L9 (-18.4122, -9.4426) -> (-18.4122, -10.7426) projected
  line L10 (-17.1122, -9.4426) -> (-18.4122, -9.4426) projected
  line L11 (-17.1122, -10.7426) -> (-17.1122, -9.4426) projected
  line L12 (-17.15, -11.45) -> (-18.45, -11.45) projected
  line L13 (-17.15, -12.75) -> (-17.15, -11.45) projected
  line L14 (-18.45, -12.75) -> (-17.15, -12.75) projected
  line L15 (-18.45, -11.45) -> (-18.45, -12.75) projected
  line L16 (-16.45, -18.75) -> (-15.15, -18.75) projected
  line L17 (-16.45, -17.45) -> (-16.45, -18.75) projected
  line L18 (-15.15, -17.45) -> (-16.45, -17.45) projected
  line L19 (-15.15, -18.75) -> (-15.15, -17.45) projected
  line L20 (-16.45, -16.75) -> (-15.15, -16.75) projected
  line L21 (-16.45, -15.45) -> (-16.45, -16.75) projected
  line L22 (-15.15, -15.45) -> (-16.45, -15.45) projected
  line L23 (-15.15, -16.75) -> (-15.15, -15.45) projected
  line L24 (-18.45, -8.75) -> (-17.15, -8.75) projected
  line L25 (-18.45, -7.45) -> (-18.45, -8.75) projected
  line L26 (-17.15, -7.45) -> (-18.45, -7.45) projected
  line L27 (-17.15, -8.75) -> (-17.15, -7.45) projected
  line L28 (-15.15, -11.45) -> (-16.45, -11.45) projected
  line L29 (-15.15, -12.75) -> (-15.15, -11.45) projected
  line L30 (-16.45, -12.75) -> (-15.15, -12.75) projected
  line L31 (-16.45, -11.45) -> (-16.45, -12.75) projected
  line L32 (-16.45, -20.75) -> (-15.15, -20.75) projected
  line L33 (-16.45, -19.45) -> (-16.45, -20.75) projected
  line L34 (-15.15, -19.45) -> (-16.45, -19.45) projected
  line L35 (-15.15, -20.75) -> (-15.15, -19.45) projected
  line L36 (-15.15, -5.45) -> (-16.45, -5.45) projected
  line L37 (-15.15, -6.75) -> (-15.15, -5.45) projected
  line L38 (-16.45, -6.75) -> (-15.15, -6.75) projected
  line L39 (-16.45, -5.45) -> (-16.45, -6.75) projected
  line L40 (-18.8, -0.9) -> (-18.8, -21.3) projected
  line L41 (-18.8, -21.3) -> (-14.8, -21.3) projected
  line L42 (-14.8, -21.3) -> (-14.8, -0.9) projected
  line L43 (-14.8, -0.9) -> (-18.8, -0.9) projected
  line L44 (-18.45, -5.45) -> (-18.45, -6.75) projected
  line L45 (-17.15, -5.45) -> (-18.45, -5.45) projected
  line L46 (-17.15, -6.75) -> (-17.15, -5.45) projected
  line L47 (-18.45, -6.75) -> (-17.15, -6.75) projected
  line L48 (-17.15, -19.45) -> (-18.45, -19.45) projected
  line L49 (-17.15, -20.75) -> (-17.15, -19.45) projected
  line L50 (-18.45, -20.75) -> (-17.15, -20.75) projected
  line L51 (-18.45, -19.45) -> (-18.45, -20.75) projected
  line L52 (-16.45, -14.75) -> (-15.15, -14.75) projected
  line L53 (-16.45, -13.45) -> (-16.45, -14.75) projected
  line L54 (-15.15, -13.45) -> (-16.45, -13.45) projected
  line L55 (-15.15, -14.75) -> (-15.15, -13.45) projected
  line L56 (-17.15, -13.45) -> (-18.45, -13.45) projected
  line L57 (-17.15, -14.75) -> (-17.15, -13.45) projected
  line L58 (-18.45, -14.75) -> (-17.15, -14.75) projected
  line L59 (-18.45, -13.45) -> (-18.45, -14.75) projected
  line L60 (-17.15, -17.45) -> (-18.45, -17.45) projected
  line L61 (-17.15, -18.75) -> (-17.15, -17.45) projected
  line L62 (-18.45, -18.75) -> (-17.15, -18.75) projected
  line L63 (-18.45, -17.45) -> (-18.45, -18.75) projected
  line L64 (-17.15, -15.45) -> (-18.45, -15.45) projected
  line L65 (-17.15, -16.75) -> (-17.15, -15.45) projected
  line L66 (-18.45, -16.75) -> (-17.15, -16.75) projected
  line L67 (-18.45, -15.45) -> (-18.45, -16.75) projected
  line L68 (-15.15, -9.45) -> (-16.45, -9.45) projected
  line L69 (-15.15, -10.75) -> (-15.15, -9.45) projected
  line L70 (-16.45, -10.75) -> (-15.15, -10.75) projected
  line L71 (-16.45, -9.45) -> (-16.45, -10.75) projected
  line L72 (-15.15, -7.45) -> (-16.45, -7.45) projected
  line L73 (-15.15, -8.75) -> (-15.15, -7.45) projected
  line L74 (-16.45, -8.75) -> (-15.15, -8.75) projected
  line L75 (-16.45, -7.45) -> (-16.45, -8.75) projected
  line L76 (-16.45, -4.75) -> (-15.15, -4.75) projected
  line L77 (-16.45, -3.45) -> (-16.45, -4.75) projected
  line L78 (-15.15, -3.45) -> (-16.45, -3.45) projected
  line L79 (-15.15, -4.75) -> (-15.15, -3.45) projected
  line L80 (-15.15, -2.75) -> (-15.15, -1.45) projected
  line L81 (-16.45, -2.75) -> (-15.15, -2.75) projected
  line L82 (-16.45, -1.45) -> (-16.45, -2.75) projected
  line L83 (-15.15, -1.45) -> (-16.45, -1.45) projected
  point P0 (0, 0)
extrude "Выдавливание3" cut sketch "Эскиз3" against normal blind 0.5 contours L1 L2 L3 L0 | L5 L6 L7 L4 | L9 L10 L11 L8 | L13 L14 L15 L12 | L17 L18 L19 L16 | L21 L22 L23 L20 | L25 L26 L27 L24 | L29 L30 L31 L28 | L33 L34 L35 L32 | L37 L38 L39 L36 | L43 L42 L41 L40 | L45 L46 L47 L44 | L49 L50 L51 L48 | L53 L54 L55 L52 | L57 L58 L59 L56 | L61 L62 L63 L60 | L65 L66 L67 L64 | L69 L70 L71 L68 | L73 L74 L75 L72 | L77 L78 L79 L76 | L81 L82 L83 L80
properties part number "kommutation_board"
